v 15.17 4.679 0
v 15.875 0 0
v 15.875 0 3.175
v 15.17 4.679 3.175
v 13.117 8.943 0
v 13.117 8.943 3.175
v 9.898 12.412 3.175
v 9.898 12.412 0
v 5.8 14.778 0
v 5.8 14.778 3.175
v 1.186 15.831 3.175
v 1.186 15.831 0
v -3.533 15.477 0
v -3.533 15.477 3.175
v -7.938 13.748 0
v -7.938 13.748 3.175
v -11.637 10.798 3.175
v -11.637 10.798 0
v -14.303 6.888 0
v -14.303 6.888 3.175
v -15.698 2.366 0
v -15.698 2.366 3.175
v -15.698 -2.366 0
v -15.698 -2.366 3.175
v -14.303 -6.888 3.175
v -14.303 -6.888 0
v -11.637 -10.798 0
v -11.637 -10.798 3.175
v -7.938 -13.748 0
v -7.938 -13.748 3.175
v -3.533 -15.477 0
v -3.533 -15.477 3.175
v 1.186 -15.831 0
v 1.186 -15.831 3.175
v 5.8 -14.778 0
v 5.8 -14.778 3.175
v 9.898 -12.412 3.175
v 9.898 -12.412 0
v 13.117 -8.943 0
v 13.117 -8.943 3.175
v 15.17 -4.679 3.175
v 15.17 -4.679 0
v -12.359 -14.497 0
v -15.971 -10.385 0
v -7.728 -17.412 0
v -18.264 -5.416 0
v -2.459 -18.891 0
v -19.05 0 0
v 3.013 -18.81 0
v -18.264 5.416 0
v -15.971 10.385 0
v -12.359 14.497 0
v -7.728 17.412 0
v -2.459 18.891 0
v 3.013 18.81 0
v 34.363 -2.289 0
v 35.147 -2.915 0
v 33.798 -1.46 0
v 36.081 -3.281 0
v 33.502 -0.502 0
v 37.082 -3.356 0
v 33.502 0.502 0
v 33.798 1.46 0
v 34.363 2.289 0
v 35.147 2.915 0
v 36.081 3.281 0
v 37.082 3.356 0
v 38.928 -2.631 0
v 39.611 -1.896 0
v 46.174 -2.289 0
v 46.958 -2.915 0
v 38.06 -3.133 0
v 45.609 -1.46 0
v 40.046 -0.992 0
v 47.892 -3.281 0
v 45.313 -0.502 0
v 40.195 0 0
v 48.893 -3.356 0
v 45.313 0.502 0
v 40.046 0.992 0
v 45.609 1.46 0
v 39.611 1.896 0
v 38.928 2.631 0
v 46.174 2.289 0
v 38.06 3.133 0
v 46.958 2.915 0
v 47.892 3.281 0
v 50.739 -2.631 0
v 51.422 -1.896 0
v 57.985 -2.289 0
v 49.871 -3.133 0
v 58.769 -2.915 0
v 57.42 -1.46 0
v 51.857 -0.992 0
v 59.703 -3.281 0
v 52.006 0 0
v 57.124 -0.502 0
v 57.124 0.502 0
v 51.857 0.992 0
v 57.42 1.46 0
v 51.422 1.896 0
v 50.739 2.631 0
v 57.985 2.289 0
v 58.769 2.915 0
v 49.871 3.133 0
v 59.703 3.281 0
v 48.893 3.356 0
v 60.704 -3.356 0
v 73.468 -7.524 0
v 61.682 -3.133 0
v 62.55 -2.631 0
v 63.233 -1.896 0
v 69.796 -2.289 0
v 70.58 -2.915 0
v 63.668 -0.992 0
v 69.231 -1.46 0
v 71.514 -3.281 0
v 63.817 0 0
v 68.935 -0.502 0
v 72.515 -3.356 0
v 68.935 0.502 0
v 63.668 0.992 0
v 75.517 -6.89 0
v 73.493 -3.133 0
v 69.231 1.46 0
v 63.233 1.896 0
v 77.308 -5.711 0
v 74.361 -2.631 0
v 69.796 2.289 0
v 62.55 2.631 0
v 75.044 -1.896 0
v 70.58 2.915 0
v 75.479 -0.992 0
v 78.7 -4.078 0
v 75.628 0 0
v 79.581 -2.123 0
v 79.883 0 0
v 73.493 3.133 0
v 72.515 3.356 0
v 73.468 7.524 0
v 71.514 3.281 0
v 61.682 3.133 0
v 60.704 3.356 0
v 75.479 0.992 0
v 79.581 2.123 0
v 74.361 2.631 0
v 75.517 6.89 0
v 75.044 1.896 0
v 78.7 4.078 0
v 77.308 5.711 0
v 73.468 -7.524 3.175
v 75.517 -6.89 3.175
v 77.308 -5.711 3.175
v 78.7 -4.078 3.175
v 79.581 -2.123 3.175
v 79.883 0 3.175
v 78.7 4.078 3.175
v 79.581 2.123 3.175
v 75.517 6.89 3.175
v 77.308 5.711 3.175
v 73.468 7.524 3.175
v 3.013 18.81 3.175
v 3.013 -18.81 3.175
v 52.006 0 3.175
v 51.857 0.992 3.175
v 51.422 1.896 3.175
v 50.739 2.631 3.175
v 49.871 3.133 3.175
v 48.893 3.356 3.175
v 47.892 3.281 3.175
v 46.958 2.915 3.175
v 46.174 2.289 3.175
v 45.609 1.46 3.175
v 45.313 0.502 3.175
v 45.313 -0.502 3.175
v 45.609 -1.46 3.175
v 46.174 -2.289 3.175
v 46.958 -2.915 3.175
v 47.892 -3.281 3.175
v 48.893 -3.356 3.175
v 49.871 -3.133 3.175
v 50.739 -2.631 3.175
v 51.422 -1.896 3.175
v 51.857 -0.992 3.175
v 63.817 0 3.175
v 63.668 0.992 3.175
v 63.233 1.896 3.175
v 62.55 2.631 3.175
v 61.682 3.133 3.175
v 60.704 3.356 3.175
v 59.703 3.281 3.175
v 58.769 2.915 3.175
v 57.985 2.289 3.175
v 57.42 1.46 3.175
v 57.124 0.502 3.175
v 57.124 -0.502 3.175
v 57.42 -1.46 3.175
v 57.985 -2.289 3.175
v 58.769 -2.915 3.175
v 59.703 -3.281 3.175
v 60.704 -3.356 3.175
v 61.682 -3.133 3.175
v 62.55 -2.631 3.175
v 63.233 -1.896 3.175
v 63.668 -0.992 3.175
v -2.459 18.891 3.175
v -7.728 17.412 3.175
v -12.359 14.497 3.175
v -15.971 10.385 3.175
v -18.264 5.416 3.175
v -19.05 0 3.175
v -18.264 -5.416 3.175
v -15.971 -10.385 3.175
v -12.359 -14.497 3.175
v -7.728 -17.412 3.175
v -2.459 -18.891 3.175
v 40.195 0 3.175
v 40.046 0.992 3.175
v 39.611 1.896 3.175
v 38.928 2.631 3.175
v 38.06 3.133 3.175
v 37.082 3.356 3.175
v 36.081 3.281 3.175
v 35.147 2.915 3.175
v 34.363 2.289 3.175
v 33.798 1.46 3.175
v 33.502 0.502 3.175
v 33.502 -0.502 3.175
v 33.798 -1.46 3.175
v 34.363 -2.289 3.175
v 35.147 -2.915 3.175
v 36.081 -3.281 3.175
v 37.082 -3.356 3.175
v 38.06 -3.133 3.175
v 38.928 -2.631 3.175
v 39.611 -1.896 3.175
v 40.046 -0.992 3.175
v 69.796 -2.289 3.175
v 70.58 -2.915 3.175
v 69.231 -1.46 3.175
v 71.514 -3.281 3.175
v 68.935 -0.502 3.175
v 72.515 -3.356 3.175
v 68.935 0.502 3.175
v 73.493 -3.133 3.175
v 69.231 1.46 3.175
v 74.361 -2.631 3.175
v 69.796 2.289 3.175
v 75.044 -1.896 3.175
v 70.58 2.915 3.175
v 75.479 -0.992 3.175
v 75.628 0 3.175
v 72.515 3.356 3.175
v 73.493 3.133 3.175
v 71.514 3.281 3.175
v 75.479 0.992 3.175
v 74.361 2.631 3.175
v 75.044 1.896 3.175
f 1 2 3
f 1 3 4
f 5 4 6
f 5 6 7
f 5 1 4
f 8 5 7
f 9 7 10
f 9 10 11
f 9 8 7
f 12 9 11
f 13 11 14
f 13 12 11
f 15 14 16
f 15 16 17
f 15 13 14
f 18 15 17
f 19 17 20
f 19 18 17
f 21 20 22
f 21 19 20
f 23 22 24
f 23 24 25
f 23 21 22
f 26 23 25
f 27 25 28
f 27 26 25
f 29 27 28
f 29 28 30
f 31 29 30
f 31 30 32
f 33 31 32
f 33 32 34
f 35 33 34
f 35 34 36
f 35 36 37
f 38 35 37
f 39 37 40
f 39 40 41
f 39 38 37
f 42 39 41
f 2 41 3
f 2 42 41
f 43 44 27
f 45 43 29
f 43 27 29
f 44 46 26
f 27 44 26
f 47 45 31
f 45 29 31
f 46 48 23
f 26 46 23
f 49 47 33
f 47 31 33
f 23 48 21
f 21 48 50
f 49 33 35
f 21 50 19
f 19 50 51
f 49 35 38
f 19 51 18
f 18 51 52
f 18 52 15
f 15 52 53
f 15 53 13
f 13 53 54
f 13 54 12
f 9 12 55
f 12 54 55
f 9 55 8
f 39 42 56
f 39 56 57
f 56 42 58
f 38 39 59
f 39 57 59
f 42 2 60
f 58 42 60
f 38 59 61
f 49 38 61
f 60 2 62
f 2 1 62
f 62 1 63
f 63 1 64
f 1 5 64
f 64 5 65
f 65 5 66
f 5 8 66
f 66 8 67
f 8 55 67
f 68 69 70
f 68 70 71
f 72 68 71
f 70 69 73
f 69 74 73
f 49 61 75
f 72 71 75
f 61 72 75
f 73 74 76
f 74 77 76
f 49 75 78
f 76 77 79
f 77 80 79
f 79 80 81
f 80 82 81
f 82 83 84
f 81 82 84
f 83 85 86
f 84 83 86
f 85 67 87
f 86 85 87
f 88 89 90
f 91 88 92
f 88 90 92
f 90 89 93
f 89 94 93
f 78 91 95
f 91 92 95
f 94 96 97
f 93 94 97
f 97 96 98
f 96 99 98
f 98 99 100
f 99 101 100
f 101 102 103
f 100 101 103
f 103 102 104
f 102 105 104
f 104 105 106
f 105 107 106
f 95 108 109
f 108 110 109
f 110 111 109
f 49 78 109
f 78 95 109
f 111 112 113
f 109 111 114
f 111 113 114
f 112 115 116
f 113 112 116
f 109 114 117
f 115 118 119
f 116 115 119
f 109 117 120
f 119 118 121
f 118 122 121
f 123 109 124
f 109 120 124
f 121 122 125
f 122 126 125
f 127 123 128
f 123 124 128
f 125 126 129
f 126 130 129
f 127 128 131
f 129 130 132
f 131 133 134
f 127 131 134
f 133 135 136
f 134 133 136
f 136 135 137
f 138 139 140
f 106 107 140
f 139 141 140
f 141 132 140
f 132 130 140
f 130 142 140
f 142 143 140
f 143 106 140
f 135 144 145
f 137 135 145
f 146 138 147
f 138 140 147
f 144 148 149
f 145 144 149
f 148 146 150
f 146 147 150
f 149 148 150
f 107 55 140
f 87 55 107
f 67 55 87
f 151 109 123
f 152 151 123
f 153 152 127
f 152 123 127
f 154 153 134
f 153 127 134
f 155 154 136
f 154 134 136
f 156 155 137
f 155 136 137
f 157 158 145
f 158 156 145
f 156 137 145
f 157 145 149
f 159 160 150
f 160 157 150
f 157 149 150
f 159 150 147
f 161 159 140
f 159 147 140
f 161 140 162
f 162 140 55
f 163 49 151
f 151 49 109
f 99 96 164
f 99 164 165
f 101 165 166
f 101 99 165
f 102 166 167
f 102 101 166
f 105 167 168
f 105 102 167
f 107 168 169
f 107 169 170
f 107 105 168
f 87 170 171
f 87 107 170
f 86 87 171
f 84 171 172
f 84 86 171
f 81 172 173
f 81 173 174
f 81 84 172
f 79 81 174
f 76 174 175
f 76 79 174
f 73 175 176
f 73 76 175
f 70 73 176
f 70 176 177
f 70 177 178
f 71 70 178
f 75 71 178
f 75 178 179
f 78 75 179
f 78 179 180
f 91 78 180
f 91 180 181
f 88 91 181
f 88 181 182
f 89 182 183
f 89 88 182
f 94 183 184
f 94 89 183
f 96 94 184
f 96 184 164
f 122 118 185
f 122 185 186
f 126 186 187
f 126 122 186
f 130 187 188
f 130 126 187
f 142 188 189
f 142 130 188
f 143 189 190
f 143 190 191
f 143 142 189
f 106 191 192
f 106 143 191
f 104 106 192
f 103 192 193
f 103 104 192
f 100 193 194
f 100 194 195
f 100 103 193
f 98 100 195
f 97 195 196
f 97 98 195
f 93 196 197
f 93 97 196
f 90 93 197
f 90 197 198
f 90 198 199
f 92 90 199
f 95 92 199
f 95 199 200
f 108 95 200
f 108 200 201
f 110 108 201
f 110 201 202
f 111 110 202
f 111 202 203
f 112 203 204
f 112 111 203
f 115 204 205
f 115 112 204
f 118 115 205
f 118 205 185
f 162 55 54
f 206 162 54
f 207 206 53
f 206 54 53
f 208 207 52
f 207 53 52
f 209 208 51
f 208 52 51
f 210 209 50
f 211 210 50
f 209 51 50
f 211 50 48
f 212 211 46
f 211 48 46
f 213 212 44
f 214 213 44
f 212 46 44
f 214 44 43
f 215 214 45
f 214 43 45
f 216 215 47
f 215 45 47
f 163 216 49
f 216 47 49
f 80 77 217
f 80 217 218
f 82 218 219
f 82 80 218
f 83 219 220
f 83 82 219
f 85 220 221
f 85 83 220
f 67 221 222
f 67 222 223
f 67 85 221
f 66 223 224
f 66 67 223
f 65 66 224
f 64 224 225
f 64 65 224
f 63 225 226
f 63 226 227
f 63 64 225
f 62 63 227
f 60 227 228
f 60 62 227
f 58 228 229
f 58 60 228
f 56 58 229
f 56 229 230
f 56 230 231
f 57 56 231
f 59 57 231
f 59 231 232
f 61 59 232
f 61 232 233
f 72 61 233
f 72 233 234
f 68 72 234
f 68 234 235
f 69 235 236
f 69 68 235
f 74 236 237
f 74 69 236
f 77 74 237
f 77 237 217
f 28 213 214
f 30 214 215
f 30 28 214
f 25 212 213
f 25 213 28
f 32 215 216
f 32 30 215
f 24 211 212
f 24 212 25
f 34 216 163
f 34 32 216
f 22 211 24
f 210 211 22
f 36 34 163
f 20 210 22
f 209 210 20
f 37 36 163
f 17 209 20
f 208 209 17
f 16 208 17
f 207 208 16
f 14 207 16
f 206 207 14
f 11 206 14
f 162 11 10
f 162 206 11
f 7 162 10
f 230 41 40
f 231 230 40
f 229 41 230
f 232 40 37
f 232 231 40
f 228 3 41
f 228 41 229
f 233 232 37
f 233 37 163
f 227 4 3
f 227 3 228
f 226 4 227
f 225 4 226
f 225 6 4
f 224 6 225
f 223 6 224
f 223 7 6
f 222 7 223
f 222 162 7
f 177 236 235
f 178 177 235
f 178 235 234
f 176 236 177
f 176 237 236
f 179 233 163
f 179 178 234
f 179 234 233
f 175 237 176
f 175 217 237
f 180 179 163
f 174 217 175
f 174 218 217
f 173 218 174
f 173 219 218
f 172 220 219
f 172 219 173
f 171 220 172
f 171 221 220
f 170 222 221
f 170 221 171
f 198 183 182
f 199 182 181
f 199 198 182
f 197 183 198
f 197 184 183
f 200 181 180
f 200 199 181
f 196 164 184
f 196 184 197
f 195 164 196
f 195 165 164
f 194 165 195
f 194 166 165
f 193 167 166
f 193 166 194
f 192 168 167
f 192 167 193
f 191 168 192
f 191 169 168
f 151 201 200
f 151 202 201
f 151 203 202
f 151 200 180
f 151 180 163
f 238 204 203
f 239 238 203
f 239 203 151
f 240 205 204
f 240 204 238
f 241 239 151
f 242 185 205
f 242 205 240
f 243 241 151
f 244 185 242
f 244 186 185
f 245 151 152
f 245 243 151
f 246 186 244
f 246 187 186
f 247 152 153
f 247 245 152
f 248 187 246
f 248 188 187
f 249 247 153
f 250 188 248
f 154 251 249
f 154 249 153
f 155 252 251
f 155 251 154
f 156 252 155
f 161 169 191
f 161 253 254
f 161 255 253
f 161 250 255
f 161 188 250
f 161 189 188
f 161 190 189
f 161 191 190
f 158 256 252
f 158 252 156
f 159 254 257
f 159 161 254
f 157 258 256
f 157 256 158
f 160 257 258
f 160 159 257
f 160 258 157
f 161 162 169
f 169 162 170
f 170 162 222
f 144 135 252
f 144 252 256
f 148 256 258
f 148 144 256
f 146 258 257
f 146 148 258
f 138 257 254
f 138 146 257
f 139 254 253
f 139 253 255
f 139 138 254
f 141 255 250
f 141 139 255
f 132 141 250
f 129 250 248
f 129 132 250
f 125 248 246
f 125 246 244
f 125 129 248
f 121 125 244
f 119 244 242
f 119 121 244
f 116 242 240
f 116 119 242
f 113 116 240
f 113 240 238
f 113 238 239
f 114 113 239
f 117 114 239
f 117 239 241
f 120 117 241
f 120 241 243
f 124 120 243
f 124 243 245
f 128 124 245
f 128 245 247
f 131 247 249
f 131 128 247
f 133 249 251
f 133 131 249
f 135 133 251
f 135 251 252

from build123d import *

# Parameters (mm, degrees)
FLAT_SKETCH_R           = 19.05
FLAT_SKETCH_R_2         = 15.875
FLAT_SKETCH_R_3         = 7.62
FLAT_SKETCH_R_4         = 3.3655
EXTRUDE_FACE_DEPTH      = 3.175
FLAT_SKETCH_4_R         = 3.3655
EXTRUDE_CUT_HOLES_DEPTH = 3.175


with BuildPart() as part:
    # Flat sketch → Extrude face (new body)
    # profile 1 of 7: a face of its own
    with BuildSketch(Plane.XY):
        Circle(FLAT_SKETCH_R)
        Circle(FLAT_SKETCH_R_2, mode=Mode.SUBTRACT)
    # profile 2 of 7: a face of its own
    with BuildSketch(Plane.XY):
        with Locations((72.263, 0)):
            Circle(FLAT_SKETCH_R_3)
        with Locations((72.263, 0)):
            Circle(FLAT_SKETCH_R_4, mode=Mode.SUBTRACT)
    # profile 3 of 7: a face of its own
    with BuildSketch(Plane.XY):
        with Locations((72.263, 0)):
            Circle(FLAT_SKETCH_R_4)
    # profile 4 of 7: a face of its own
    with BuildSketch(Plane.XY):
        with BuildLine():
            Line((73.468272408, 7.524075918), (3.013181019, 18.810189796))
            ThreePointArc((3.013181019, 18.810189796), (14.49661337, 12.359235445), (19.05, 0))
            ThreePointArc((19.05, 0), (14.49661337, -12.359235445), (3.013181019, -18.810189796))
            Line((3.013181019, -18.810189796), (73.468272408, -7.524075918))
            ThreePointArc((73.468272408, -7.524075918), (64.643, 0), (73.468272408, 7.524075918))
        make_face()
        with Locations((36.83, 0)):
            Circle(FLAT_SKETCH_R_4, mode=Mode.SUBTRACT)
        with Locations((48.641, 0)):
            Circle(FLAT_SKETCH_R_4, mode=Mode.SUBTRACT)
        with Locations((60.452, 0)):
            Circle(FLAT_SKETCH_R_4, mode=Mode.SUBTRACT)
    # profile 5 of 7: a face of its own
    with BuildSketch(Plane.XY):
        with Locations((60.452, 0)):
            Circle(FLAT_SKETCH_R_4)
    # profile 6 of 7: a face of its own
    with BuildSketch(Plane.XY):
        with Locations((48.641, 0)):
            Circle(FLAT_SKETCH_R_4)
    # profile 7 of 7: a face of its own
    with BuildSketch(Plane.XY):
        with Locations((36.83, 0)):
            Circle(FLAT_SKETCH_R_4)
    extrude(amount=EXTRUDE_FACE_DEPTH)

    # Flat sketch<4> → Extrude cut - holes (cut)
    with BuildSketch(Plane.XY):
        with Locations((72.263, 0)):
            Circle(FLAT_SKETCH_4_R)
        with Locations((60.452, 0)):
            Circle(FLAT_SKETCH_4_R)
        with Locations((48.641, 0)):
            Circle(FLAT_SKETCH_4_R)
        with Locations((36.83, 0)):
            Circle(FLAT_SKETCH_4_R)
    extrude(amount=EXTRUDE_CUT_HOLES_DEPTH, mode=Mode.SUBTRACT)


solid = part.part
